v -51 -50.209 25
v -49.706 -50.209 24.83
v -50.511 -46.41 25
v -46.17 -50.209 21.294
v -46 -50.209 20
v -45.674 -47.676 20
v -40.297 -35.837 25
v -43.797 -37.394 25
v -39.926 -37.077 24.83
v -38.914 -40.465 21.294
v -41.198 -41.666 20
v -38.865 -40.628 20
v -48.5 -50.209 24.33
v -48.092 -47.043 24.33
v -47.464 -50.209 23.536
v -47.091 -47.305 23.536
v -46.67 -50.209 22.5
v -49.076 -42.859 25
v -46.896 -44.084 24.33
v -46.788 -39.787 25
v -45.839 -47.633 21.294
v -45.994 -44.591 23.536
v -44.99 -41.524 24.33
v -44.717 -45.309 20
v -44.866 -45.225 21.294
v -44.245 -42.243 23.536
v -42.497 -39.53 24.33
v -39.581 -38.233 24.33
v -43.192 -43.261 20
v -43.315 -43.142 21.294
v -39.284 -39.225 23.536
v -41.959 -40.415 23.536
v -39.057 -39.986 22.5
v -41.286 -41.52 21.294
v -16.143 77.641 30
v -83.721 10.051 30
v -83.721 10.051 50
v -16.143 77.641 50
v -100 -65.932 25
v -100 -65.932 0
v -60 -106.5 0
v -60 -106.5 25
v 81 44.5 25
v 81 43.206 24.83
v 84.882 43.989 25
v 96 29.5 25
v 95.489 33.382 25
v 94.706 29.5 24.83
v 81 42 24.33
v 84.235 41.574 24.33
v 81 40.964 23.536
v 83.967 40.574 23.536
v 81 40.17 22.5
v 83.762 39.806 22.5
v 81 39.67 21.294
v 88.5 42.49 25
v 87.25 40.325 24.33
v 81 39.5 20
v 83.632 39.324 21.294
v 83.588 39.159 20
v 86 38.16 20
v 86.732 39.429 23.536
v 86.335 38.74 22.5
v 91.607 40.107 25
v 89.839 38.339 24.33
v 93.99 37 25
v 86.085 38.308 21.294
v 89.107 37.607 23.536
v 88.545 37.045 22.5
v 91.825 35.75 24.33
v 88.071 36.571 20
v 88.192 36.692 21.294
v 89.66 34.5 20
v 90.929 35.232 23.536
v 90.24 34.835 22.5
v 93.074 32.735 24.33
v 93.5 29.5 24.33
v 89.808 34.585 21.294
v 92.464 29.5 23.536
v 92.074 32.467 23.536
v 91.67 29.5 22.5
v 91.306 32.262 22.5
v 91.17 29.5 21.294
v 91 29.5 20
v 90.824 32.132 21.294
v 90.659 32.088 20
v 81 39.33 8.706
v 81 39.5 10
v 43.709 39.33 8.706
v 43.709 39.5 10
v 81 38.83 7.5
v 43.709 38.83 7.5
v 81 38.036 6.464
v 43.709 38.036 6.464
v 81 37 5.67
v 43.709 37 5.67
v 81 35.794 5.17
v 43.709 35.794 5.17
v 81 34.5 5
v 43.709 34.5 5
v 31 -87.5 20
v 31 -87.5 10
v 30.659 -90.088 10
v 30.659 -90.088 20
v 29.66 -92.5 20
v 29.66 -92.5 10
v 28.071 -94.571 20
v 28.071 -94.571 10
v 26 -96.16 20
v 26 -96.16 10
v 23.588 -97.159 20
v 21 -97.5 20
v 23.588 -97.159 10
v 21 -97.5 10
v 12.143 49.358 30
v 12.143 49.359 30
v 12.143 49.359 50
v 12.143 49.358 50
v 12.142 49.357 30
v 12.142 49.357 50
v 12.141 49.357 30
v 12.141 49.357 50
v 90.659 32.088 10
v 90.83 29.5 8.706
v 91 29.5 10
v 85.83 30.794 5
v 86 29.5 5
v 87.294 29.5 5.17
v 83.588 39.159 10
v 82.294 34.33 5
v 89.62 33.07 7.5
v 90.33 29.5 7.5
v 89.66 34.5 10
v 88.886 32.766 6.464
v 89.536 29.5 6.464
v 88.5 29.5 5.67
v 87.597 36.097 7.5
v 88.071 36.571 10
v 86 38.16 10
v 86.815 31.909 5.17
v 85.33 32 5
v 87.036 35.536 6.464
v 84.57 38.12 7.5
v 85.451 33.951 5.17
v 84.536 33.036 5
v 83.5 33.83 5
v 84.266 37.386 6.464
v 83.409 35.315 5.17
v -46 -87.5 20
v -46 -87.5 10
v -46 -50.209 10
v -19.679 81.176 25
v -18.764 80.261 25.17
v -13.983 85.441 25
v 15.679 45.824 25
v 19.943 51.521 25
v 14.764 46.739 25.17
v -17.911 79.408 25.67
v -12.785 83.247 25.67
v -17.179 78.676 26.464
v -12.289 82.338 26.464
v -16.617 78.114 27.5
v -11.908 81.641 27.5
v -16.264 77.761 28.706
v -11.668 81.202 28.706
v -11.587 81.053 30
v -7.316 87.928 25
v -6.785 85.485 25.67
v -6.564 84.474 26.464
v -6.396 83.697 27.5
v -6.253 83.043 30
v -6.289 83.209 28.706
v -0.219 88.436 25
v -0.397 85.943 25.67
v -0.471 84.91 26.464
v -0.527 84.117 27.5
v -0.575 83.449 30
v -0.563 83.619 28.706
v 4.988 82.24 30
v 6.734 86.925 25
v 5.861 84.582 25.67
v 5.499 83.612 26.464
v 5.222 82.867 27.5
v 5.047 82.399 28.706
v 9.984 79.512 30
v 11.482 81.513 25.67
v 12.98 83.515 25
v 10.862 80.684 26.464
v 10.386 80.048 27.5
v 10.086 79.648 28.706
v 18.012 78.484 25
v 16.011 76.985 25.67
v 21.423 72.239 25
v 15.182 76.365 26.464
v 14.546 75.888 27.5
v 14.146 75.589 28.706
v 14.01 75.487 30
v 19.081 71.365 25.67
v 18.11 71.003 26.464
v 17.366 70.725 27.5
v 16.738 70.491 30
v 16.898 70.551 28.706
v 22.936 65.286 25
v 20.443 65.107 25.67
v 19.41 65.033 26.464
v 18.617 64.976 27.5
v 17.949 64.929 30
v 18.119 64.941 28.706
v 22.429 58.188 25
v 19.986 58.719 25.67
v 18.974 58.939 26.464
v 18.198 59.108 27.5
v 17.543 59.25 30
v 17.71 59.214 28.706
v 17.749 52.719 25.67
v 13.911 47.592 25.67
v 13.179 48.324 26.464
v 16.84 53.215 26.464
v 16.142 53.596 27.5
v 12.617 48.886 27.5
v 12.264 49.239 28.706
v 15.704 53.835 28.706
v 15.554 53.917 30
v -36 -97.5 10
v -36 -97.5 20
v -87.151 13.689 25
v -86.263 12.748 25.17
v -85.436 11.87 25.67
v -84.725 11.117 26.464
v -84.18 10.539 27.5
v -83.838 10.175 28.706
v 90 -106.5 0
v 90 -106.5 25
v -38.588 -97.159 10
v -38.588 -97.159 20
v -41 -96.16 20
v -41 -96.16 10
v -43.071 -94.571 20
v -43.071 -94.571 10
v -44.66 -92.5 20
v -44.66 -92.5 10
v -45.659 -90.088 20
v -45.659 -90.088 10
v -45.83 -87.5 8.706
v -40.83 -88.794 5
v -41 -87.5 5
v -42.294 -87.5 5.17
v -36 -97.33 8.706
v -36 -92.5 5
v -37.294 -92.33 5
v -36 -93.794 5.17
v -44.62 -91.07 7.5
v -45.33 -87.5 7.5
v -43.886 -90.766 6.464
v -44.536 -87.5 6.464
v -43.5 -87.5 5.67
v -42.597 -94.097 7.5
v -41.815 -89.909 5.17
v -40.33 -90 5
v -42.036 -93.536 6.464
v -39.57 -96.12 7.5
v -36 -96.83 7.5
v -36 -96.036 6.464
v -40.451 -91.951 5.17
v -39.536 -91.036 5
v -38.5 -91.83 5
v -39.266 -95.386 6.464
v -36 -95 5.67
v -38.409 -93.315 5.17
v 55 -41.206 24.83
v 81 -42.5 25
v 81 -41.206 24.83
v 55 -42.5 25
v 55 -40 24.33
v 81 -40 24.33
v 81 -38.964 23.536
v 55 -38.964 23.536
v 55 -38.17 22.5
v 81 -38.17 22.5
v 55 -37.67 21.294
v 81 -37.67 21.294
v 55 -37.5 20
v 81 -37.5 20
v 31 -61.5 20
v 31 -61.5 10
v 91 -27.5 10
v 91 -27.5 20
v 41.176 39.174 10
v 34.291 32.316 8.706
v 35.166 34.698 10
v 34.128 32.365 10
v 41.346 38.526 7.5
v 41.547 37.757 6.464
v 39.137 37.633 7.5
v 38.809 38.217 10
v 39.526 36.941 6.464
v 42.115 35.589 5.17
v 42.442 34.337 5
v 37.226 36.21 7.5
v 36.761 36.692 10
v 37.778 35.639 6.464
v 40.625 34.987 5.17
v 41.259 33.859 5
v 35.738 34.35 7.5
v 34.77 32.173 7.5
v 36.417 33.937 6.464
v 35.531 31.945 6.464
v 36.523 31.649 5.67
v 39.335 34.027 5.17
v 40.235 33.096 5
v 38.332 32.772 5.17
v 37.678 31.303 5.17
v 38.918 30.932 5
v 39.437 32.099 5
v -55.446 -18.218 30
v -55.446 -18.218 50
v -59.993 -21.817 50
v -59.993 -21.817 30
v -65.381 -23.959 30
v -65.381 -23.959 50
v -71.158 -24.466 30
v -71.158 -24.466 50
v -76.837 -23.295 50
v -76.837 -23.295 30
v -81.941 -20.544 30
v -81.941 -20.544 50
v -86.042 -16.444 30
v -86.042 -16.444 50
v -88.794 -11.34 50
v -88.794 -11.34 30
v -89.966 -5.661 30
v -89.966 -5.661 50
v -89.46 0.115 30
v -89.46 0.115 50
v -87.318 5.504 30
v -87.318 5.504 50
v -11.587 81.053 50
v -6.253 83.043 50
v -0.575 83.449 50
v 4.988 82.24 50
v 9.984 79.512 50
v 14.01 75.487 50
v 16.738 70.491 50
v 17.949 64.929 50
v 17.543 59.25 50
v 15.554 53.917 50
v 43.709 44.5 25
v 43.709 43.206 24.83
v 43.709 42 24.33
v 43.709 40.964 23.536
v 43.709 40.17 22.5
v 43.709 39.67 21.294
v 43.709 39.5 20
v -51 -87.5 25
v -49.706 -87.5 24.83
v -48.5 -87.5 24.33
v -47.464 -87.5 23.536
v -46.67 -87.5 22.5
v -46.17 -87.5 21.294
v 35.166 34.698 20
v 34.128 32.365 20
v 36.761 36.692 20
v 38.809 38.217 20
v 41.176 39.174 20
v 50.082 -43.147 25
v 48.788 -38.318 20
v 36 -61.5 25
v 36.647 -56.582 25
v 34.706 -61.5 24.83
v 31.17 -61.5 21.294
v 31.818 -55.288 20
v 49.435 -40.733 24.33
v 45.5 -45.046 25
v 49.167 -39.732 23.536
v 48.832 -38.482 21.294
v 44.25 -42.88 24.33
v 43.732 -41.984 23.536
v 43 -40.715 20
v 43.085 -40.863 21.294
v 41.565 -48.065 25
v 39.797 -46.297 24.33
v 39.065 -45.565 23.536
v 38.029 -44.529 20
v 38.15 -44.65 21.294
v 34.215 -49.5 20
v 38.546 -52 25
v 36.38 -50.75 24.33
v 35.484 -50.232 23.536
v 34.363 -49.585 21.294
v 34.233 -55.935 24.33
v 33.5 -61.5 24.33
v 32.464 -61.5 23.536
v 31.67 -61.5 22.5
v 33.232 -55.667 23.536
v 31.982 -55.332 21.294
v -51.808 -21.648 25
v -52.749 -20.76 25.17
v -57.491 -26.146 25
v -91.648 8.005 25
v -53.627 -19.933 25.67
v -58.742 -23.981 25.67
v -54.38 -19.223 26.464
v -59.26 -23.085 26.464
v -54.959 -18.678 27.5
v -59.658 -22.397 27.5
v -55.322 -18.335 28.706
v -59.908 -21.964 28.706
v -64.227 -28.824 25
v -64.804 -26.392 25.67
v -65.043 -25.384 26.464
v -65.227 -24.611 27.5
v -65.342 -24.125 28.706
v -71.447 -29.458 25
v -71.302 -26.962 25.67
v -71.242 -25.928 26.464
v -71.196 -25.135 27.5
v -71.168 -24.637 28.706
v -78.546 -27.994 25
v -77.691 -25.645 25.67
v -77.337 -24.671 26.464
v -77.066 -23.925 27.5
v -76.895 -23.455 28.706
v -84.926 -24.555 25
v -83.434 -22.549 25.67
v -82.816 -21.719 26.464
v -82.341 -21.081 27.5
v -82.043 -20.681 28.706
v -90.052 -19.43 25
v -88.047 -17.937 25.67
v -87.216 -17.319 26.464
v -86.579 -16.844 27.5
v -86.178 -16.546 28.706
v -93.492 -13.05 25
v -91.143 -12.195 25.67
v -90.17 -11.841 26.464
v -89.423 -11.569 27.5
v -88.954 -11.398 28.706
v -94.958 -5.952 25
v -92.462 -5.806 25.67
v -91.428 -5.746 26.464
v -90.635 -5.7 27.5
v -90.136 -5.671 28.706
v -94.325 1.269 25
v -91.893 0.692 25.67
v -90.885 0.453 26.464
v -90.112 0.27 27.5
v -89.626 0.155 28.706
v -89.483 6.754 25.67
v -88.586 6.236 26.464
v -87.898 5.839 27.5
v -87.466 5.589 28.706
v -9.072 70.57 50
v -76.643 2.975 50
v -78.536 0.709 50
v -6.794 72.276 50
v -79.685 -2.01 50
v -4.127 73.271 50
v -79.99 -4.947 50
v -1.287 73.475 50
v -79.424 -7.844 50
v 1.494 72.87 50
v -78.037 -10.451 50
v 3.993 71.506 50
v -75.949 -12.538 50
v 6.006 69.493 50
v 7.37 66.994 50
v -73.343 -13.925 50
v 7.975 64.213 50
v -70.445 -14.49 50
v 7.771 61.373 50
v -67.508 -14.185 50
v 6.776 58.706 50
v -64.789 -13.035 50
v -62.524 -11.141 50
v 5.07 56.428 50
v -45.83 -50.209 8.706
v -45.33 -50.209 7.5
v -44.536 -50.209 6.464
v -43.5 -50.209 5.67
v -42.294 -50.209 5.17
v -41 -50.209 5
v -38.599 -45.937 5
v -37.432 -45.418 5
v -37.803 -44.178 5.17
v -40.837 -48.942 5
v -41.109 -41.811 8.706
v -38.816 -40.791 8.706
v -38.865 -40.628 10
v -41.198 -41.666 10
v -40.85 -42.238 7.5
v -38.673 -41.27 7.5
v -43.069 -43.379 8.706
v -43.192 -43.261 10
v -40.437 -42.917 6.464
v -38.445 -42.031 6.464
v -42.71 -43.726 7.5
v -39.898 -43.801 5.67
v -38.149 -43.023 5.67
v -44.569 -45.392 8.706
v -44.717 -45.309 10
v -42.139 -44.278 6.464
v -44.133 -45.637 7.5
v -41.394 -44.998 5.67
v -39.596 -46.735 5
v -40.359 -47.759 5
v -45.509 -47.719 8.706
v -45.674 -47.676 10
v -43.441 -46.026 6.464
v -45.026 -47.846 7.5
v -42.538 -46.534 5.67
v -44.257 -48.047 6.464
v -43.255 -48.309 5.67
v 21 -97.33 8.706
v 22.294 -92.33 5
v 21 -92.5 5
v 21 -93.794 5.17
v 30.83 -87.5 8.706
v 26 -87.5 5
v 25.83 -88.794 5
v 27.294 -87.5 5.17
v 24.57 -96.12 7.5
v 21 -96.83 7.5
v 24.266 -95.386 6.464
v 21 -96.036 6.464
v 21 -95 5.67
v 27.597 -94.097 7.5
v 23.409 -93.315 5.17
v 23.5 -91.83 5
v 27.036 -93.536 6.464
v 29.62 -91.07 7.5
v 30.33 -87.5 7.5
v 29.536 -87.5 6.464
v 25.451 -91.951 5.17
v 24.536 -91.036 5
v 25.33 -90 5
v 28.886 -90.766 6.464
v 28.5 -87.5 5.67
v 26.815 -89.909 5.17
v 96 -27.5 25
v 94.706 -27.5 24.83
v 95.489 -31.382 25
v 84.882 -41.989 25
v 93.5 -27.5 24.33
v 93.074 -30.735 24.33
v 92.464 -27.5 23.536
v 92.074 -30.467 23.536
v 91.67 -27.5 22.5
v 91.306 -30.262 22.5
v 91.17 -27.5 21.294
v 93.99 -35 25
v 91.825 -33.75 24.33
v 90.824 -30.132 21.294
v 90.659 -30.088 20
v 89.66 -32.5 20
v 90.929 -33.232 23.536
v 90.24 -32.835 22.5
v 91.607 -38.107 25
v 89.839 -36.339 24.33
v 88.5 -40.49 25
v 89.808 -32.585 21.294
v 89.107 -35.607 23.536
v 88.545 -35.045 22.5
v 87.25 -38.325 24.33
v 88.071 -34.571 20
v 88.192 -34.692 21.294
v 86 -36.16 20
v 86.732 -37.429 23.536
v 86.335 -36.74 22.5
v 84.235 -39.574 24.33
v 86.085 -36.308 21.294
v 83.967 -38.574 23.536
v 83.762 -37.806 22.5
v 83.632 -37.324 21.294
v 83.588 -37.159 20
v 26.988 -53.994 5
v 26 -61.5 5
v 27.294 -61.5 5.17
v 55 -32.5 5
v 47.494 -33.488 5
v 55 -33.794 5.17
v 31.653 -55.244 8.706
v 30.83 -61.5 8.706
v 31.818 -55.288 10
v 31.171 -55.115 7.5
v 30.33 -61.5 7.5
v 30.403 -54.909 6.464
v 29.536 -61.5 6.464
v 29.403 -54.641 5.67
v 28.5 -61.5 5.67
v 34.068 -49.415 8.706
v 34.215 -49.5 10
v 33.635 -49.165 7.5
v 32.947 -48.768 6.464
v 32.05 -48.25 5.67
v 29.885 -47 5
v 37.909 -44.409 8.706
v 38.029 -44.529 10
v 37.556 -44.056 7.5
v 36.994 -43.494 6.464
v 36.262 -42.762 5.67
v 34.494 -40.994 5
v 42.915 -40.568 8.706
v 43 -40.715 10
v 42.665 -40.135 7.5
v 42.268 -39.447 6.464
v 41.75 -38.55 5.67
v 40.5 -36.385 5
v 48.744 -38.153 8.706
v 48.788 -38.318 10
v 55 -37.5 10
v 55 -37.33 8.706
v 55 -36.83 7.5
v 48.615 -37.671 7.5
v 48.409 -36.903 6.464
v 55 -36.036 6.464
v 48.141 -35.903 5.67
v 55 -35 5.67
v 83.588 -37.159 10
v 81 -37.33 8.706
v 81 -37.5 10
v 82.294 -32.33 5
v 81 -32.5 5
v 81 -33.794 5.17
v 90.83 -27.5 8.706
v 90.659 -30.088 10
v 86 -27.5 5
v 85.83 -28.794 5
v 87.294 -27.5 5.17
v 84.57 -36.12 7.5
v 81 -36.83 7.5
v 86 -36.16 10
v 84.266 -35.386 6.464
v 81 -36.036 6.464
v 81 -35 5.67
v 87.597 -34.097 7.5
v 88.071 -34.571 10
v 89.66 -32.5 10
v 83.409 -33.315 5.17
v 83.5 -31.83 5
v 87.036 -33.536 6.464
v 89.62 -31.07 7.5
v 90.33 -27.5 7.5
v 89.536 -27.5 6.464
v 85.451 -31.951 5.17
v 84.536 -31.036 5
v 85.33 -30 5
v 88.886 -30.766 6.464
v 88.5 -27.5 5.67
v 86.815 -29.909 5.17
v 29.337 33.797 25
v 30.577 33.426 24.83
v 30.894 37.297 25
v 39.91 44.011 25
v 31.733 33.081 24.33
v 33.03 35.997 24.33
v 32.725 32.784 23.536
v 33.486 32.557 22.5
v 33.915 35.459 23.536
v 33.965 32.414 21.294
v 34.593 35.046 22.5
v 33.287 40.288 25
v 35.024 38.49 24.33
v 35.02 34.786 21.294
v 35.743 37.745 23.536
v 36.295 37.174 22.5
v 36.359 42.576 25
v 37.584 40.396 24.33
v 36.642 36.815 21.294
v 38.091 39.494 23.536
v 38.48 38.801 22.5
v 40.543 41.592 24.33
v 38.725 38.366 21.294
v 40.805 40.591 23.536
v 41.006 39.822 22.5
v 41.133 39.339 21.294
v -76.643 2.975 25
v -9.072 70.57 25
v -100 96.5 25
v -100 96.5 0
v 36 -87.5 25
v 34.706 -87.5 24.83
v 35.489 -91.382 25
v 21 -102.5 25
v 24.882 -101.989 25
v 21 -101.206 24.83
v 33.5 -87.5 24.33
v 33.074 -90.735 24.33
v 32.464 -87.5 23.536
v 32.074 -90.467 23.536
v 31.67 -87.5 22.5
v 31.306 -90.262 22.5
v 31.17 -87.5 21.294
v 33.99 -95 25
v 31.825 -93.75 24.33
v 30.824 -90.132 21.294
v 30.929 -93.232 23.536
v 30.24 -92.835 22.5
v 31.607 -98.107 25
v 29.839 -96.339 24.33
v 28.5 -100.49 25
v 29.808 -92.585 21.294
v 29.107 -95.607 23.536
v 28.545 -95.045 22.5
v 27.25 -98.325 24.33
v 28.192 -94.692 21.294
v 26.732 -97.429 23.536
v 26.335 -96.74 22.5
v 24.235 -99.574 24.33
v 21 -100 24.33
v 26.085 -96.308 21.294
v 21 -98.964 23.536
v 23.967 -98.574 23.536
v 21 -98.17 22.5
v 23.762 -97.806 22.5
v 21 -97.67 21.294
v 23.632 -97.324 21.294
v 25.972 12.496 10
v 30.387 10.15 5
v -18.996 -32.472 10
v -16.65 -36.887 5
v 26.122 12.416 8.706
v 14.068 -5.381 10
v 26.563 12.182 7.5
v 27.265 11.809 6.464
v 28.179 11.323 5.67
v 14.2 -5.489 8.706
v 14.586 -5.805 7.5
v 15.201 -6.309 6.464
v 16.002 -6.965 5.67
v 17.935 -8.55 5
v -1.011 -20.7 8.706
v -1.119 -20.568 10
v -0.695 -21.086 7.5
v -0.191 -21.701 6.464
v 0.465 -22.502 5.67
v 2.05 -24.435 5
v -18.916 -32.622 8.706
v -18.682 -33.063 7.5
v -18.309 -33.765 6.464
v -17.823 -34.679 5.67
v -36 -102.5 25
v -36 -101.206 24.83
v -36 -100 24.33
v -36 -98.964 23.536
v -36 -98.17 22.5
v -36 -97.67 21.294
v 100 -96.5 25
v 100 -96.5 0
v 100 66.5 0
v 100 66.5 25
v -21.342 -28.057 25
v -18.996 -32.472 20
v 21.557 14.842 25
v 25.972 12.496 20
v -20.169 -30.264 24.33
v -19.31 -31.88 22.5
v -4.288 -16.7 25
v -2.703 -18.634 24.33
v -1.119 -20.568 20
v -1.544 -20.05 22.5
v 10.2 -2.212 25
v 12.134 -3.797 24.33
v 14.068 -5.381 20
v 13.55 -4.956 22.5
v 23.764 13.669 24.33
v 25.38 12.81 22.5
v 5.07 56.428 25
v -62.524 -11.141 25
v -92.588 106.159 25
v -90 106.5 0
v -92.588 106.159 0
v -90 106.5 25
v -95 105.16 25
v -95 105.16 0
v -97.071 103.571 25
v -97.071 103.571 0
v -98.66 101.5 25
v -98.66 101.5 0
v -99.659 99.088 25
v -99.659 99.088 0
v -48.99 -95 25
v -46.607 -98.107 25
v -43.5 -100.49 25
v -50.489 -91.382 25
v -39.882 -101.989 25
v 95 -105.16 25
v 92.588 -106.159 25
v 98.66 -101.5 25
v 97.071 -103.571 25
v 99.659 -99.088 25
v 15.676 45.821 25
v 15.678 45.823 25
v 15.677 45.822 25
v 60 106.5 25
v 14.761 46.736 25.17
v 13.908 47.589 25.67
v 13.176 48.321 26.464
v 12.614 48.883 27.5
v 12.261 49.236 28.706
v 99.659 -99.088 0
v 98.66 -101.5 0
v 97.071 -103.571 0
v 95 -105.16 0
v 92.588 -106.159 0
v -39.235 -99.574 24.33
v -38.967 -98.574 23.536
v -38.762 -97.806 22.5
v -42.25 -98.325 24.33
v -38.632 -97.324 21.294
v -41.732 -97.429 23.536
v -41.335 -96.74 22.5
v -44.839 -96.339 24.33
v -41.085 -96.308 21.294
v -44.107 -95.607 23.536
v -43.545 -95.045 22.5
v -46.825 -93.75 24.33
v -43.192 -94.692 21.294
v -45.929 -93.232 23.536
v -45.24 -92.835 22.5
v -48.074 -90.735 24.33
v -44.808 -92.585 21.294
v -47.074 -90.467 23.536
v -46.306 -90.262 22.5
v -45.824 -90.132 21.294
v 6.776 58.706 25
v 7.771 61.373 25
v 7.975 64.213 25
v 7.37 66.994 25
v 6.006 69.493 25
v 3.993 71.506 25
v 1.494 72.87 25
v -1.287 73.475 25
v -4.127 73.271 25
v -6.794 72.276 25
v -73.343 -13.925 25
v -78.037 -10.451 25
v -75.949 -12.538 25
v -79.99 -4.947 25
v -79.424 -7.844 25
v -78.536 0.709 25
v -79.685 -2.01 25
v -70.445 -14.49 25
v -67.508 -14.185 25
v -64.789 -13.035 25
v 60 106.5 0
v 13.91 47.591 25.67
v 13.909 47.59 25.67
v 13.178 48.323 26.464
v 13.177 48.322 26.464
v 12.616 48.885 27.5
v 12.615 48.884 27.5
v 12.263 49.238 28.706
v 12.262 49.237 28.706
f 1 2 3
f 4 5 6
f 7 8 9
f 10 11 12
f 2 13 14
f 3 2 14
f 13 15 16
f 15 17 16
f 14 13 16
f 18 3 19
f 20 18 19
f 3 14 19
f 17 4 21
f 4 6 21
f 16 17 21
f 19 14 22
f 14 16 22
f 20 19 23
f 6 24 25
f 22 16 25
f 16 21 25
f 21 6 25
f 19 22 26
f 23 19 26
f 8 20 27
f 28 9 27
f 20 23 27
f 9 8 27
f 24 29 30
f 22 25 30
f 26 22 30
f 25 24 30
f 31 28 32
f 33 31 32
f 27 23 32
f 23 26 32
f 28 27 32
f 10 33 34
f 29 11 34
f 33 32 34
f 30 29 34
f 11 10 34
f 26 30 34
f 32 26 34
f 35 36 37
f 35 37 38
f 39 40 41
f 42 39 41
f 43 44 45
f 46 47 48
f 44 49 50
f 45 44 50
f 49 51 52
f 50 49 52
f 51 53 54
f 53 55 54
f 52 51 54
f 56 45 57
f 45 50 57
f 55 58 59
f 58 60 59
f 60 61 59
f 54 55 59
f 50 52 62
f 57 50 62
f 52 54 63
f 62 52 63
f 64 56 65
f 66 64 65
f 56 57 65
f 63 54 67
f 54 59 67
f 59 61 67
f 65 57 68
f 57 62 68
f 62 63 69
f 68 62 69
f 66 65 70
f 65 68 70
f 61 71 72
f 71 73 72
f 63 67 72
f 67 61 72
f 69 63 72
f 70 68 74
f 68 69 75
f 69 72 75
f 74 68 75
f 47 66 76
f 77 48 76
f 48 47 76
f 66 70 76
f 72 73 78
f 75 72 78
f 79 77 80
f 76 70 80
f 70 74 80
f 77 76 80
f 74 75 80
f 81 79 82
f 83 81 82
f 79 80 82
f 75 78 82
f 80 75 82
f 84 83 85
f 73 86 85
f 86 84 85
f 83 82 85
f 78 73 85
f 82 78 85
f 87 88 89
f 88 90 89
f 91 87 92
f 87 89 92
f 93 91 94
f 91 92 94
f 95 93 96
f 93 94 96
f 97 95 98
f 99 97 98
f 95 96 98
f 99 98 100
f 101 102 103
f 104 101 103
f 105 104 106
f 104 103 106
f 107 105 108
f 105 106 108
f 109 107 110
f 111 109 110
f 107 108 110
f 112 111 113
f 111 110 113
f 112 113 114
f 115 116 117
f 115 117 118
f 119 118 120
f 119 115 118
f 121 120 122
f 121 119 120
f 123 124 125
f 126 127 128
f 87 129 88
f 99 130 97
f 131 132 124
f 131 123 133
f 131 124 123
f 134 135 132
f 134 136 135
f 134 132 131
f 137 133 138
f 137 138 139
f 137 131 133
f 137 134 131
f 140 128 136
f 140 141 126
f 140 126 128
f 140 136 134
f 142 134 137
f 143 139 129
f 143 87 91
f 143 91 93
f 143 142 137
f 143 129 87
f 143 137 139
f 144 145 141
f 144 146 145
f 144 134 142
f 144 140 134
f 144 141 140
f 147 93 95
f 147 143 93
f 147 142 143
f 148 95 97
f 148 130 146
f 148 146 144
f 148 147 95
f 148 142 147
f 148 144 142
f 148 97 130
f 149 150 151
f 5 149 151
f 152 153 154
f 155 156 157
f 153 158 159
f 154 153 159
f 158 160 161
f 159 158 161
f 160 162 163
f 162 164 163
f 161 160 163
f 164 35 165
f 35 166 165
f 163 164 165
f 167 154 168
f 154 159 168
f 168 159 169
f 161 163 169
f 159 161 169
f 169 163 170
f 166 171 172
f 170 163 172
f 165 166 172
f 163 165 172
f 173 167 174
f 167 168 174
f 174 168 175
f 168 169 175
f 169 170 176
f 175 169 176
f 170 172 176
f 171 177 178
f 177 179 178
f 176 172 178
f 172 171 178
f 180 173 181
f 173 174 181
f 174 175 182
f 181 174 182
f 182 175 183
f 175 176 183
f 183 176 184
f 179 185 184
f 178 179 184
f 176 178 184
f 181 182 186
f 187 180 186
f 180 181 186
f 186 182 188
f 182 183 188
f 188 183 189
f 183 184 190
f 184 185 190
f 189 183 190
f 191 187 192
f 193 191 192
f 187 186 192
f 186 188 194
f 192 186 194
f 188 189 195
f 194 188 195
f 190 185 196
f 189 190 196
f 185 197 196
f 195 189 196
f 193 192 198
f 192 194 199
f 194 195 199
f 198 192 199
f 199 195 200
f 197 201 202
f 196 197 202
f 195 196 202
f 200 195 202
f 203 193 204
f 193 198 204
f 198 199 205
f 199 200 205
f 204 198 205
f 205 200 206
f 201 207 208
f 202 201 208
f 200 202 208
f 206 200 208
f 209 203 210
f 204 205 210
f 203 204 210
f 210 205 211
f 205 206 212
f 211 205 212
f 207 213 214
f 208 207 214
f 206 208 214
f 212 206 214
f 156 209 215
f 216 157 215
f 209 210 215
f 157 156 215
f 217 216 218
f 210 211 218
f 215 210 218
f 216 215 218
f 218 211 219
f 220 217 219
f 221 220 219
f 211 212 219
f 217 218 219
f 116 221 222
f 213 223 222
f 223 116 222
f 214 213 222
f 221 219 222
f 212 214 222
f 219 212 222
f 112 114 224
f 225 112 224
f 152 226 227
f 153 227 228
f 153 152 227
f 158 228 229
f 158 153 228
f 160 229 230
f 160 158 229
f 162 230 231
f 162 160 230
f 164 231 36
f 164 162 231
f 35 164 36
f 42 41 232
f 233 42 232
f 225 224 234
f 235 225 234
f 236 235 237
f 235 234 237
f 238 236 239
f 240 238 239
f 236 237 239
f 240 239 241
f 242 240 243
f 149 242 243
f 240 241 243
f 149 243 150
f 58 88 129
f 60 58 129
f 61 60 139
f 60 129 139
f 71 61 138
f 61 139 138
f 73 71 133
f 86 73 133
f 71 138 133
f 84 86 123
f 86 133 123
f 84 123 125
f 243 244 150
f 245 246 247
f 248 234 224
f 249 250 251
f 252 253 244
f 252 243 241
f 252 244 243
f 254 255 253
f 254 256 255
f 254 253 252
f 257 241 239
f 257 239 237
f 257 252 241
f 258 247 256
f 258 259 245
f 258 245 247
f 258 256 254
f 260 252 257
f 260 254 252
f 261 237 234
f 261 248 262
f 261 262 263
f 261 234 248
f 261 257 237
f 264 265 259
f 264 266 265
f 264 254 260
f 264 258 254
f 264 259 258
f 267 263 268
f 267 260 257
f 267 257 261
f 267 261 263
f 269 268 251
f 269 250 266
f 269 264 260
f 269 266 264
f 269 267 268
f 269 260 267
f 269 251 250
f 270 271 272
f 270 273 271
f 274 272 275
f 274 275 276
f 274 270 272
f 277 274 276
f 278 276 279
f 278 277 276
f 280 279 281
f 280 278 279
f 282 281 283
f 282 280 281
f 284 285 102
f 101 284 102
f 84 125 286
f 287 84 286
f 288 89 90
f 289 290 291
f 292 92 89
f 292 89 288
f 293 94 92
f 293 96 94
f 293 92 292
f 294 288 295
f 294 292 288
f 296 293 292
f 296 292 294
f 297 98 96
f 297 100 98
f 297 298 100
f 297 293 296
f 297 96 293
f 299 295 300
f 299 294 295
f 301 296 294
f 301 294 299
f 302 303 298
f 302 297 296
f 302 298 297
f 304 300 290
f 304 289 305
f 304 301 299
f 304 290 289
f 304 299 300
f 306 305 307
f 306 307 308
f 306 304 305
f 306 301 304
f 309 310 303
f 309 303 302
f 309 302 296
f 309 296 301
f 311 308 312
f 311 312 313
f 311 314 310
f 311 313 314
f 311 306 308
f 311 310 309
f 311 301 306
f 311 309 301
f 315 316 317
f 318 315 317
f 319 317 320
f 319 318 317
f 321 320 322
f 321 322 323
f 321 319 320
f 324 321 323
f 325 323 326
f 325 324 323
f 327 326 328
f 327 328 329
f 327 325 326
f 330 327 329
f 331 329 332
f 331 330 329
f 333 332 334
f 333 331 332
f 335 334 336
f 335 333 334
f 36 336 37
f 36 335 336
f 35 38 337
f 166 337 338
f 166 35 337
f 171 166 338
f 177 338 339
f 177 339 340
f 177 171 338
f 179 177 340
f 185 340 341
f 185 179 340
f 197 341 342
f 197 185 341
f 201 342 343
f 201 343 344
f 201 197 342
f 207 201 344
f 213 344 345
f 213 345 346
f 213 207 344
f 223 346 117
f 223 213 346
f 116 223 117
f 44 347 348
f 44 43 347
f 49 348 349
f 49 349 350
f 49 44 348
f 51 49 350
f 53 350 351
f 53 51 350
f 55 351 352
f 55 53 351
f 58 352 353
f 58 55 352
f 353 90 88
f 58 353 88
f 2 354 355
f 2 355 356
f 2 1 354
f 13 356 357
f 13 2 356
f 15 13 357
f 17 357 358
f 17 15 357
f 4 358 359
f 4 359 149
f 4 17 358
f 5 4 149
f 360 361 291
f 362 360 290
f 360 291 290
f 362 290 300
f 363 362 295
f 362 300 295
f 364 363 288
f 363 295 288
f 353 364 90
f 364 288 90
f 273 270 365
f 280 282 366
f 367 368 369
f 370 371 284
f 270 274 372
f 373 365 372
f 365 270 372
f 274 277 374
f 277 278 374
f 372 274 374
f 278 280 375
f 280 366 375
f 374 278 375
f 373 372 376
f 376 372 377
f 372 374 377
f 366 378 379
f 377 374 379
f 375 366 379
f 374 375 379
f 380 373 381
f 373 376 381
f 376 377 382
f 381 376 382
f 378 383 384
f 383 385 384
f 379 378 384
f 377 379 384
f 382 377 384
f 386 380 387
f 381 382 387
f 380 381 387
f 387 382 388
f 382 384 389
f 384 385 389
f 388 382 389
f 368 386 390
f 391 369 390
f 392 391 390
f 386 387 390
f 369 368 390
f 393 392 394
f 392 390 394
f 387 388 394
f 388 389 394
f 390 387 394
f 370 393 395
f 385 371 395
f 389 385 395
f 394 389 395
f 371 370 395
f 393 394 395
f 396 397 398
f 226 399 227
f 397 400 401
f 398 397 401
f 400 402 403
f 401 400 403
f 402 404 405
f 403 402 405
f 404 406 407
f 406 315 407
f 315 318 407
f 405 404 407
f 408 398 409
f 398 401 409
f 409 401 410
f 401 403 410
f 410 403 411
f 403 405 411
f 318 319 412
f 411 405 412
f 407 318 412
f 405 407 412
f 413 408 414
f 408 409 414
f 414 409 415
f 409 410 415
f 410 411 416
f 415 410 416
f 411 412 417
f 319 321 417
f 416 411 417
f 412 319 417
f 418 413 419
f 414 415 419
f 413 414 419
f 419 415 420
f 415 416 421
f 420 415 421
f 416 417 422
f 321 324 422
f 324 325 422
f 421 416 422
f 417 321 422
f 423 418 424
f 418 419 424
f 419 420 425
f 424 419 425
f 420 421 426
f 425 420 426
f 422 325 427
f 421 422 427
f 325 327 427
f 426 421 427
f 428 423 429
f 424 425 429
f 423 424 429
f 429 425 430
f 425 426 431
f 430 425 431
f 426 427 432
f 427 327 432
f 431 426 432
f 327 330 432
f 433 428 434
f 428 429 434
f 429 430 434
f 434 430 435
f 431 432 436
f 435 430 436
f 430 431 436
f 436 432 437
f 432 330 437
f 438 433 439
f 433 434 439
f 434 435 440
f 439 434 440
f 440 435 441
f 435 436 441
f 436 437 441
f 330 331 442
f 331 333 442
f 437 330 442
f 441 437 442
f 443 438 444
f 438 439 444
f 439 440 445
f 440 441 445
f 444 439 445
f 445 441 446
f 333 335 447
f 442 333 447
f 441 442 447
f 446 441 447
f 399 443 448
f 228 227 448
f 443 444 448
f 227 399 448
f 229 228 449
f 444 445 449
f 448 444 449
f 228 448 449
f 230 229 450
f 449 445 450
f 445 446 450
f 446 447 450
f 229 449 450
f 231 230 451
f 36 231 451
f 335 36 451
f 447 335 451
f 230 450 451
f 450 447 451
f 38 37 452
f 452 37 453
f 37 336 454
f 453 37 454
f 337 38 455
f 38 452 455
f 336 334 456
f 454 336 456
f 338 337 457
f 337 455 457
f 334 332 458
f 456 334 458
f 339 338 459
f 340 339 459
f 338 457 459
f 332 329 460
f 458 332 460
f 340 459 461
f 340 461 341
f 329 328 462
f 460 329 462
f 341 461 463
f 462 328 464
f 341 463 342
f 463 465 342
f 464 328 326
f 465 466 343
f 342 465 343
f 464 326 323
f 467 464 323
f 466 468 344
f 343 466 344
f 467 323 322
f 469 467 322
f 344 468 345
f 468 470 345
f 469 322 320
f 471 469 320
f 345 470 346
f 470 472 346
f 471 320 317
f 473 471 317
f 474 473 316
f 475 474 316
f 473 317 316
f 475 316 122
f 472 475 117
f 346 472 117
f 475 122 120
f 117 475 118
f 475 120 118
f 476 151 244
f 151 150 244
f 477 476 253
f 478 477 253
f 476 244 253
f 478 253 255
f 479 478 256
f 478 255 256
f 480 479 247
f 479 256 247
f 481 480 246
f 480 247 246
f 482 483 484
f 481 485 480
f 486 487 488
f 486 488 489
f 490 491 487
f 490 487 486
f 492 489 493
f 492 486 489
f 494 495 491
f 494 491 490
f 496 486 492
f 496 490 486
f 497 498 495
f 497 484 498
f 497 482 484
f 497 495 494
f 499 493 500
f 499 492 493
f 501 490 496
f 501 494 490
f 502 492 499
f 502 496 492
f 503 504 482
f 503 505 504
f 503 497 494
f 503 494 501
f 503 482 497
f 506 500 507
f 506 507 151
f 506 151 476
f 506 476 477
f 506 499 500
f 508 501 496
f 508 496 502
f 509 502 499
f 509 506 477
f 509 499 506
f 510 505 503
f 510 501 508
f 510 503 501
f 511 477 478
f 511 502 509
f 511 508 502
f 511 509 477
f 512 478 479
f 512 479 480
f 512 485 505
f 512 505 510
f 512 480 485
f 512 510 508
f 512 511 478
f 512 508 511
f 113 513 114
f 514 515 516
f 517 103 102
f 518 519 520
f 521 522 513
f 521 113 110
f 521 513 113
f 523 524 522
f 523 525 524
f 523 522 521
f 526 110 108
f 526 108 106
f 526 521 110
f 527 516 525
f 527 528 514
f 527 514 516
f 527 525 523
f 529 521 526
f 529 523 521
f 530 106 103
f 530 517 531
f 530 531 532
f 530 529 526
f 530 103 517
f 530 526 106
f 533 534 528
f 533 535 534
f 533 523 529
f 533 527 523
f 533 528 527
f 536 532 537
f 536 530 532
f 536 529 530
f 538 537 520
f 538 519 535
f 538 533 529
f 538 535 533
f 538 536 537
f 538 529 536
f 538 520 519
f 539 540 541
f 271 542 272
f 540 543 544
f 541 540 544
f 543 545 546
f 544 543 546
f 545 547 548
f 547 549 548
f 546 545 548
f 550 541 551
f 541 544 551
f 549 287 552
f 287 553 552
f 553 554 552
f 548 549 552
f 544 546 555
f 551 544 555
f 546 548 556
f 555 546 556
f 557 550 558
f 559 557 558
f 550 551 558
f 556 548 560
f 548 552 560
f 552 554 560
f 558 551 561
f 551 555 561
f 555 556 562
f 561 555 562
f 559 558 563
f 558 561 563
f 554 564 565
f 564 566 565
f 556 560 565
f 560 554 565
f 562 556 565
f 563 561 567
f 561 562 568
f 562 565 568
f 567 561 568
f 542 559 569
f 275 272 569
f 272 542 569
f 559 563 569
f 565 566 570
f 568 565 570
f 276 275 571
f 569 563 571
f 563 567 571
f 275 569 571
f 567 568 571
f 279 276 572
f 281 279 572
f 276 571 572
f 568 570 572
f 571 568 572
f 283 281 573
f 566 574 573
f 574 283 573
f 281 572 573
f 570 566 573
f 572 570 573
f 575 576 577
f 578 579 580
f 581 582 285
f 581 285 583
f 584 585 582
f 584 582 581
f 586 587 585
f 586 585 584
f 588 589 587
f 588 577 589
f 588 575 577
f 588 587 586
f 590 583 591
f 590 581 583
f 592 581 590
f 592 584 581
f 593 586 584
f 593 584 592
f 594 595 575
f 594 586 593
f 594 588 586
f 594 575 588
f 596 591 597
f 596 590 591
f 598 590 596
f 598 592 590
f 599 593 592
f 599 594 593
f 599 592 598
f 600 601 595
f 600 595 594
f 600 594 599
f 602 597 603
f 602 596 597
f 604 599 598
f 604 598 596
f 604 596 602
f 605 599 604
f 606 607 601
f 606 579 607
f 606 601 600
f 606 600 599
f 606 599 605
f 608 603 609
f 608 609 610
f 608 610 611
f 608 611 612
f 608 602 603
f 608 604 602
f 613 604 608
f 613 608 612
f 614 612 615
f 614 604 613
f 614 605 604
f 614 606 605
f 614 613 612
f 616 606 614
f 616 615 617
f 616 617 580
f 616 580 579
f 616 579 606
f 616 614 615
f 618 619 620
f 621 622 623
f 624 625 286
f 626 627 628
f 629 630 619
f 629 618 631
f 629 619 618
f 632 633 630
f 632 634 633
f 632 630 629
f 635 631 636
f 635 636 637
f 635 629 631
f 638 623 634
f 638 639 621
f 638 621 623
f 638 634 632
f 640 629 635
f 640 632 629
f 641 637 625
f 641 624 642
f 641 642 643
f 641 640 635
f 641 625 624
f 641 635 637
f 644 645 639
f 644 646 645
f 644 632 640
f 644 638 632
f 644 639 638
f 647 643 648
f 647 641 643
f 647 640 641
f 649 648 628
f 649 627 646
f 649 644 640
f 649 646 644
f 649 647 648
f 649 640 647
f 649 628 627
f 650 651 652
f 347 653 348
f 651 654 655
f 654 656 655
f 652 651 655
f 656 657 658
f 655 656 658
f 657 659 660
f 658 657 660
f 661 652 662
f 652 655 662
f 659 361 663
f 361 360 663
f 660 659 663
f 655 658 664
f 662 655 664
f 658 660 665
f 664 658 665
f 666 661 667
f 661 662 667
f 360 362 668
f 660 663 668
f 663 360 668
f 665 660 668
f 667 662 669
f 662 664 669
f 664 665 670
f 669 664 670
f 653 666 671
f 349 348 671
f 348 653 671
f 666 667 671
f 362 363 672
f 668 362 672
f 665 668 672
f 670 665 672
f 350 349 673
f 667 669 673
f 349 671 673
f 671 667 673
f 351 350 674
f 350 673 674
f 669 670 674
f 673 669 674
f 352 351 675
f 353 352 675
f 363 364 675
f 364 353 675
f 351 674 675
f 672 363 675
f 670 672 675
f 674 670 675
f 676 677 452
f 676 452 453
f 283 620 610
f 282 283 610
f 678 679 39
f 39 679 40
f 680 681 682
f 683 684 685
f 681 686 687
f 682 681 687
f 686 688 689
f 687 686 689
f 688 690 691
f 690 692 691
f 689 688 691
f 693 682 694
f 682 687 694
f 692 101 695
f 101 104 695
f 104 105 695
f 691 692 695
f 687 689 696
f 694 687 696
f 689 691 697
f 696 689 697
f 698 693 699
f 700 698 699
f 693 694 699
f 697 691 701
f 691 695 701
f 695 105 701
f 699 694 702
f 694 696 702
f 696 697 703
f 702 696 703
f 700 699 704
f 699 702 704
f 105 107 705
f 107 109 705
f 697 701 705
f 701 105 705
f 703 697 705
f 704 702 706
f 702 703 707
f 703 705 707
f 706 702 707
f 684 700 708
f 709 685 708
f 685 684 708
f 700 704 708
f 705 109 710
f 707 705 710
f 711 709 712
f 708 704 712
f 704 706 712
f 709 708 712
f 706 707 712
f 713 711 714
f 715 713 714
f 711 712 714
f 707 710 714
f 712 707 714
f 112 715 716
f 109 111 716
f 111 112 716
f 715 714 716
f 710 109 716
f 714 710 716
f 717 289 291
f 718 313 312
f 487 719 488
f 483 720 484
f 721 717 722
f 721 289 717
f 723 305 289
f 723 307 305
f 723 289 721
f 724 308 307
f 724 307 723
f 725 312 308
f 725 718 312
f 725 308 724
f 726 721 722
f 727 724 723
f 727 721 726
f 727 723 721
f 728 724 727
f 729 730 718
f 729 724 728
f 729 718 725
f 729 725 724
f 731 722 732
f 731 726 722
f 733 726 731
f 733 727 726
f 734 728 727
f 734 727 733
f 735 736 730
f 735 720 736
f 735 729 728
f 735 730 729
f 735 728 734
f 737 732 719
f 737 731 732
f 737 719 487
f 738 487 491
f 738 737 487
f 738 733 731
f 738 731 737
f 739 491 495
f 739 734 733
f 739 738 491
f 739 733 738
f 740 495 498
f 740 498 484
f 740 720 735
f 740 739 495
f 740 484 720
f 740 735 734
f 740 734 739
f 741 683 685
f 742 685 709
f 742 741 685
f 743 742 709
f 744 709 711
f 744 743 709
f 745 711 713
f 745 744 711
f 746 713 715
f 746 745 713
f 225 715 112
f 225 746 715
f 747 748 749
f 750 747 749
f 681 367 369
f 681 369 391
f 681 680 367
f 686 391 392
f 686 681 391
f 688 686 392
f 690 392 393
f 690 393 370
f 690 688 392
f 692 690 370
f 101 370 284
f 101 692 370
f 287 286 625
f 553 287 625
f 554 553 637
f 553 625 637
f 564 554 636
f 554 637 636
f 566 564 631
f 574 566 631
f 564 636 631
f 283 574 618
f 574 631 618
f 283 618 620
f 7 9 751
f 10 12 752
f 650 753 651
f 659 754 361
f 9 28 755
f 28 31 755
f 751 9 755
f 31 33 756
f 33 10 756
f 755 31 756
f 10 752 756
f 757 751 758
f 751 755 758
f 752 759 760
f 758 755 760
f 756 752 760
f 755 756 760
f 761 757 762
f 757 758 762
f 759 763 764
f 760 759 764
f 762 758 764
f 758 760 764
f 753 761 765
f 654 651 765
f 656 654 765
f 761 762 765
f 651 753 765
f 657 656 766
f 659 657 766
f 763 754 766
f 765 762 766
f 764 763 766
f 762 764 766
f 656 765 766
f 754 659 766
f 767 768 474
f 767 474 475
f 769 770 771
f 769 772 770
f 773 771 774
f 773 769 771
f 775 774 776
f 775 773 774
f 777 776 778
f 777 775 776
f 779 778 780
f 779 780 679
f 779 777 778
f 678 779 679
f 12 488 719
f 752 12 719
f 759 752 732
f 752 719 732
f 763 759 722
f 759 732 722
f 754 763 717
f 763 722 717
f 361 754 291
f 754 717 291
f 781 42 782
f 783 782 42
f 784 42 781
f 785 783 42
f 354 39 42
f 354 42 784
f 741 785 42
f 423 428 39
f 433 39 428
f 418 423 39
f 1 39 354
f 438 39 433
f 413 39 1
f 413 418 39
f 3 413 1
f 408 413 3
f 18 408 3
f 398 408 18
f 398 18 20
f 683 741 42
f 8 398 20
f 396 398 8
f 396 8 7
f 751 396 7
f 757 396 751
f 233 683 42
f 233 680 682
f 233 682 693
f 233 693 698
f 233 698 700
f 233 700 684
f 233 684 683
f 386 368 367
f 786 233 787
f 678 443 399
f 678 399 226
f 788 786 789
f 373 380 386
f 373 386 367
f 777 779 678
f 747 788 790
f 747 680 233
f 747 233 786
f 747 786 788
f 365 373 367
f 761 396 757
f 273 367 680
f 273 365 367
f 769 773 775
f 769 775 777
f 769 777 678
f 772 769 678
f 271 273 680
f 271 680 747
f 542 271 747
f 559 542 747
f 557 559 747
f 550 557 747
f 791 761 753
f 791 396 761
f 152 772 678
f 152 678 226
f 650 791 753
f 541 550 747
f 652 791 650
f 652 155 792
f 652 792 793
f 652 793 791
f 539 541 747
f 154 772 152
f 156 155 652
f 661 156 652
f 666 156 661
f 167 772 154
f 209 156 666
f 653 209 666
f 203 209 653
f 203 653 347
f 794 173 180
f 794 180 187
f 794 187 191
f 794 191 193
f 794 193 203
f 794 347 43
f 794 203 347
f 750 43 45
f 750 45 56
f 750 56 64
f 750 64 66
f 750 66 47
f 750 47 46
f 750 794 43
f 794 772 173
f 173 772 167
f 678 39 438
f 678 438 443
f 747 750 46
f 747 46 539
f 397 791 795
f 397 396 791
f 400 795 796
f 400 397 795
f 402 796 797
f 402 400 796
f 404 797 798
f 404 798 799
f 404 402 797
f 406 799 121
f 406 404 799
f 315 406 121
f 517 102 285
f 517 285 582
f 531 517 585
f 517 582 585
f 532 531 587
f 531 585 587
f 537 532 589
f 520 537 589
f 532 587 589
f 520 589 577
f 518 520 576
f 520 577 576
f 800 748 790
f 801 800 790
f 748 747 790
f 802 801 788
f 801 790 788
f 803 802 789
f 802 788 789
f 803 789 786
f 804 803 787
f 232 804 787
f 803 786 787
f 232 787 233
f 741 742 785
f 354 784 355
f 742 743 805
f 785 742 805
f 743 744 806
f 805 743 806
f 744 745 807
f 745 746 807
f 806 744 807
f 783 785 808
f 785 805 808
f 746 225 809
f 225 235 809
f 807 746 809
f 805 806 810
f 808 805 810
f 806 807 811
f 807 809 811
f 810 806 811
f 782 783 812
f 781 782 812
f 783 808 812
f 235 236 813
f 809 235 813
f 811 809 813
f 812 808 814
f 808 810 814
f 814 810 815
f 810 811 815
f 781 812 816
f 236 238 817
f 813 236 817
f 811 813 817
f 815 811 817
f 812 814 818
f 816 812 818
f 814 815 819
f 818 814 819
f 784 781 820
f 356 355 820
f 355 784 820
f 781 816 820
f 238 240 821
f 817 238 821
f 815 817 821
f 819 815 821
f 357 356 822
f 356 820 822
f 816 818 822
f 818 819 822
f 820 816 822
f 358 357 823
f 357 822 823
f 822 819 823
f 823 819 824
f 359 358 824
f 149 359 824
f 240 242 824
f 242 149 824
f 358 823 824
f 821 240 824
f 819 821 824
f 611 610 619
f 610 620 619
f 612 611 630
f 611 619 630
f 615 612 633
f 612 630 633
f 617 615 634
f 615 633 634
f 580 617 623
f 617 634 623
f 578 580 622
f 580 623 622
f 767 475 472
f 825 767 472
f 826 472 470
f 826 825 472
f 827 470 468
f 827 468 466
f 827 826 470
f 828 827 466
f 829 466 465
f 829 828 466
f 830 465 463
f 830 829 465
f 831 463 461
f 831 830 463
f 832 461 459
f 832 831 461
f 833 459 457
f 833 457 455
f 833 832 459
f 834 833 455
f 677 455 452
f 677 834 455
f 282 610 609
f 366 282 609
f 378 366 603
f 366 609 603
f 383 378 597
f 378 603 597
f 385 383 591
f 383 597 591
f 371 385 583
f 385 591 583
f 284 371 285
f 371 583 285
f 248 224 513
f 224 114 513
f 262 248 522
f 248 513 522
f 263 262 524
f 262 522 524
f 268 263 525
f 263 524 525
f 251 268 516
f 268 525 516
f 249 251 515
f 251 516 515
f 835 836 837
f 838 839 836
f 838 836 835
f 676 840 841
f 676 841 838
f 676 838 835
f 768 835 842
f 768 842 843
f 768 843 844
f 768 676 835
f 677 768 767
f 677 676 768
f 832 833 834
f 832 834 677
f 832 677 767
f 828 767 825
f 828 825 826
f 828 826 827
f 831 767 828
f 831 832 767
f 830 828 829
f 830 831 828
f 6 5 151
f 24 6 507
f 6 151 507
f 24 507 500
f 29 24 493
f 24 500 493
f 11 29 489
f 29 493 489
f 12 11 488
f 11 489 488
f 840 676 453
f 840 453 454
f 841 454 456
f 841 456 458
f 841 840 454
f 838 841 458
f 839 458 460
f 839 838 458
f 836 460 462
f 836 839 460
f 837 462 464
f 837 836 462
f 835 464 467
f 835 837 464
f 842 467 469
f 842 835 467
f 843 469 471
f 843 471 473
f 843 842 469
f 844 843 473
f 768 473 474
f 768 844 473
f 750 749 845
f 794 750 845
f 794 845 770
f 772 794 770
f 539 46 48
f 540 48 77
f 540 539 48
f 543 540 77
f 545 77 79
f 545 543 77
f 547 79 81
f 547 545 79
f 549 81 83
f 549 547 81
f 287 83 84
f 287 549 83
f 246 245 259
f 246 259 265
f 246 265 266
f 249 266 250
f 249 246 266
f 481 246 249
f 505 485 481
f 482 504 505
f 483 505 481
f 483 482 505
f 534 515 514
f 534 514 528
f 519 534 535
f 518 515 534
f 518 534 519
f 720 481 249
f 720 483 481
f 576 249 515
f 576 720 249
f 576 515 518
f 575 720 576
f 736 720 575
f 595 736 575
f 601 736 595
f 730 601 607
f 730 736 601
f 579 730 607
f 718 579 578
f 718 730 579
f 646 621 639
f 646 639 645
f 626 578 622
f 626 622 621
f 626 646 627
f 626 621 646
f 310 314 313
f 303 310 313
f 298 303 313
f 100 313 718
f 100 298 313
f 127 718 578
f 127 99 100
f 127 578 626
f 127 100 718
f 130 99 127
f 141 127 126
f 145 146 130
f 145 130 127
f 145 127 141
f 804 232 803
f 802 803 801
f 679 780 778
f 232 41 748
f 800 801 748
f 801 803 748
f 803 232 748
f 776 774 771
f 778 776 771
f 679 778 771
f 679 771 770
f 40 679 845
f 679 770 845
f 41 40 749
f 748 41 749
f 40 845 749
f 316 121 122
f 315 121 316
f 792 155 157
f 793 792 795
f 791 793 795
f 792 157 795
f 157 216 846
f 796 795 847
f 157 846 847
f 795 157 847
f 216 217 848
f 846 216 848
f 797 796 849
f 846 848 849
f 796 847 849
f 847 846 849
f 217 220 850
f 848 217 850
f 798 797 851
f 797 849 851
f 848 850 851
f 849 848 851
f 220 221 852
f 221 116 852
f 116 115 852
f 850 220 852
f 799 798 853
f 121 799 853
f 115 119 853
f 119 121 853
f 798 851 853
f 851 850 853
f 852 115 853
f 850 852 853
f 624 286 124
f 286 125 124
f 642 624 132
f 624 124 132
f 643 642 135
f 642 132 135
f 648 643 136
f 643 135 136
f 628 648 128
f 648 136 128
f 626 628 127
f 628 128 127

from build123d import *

# Parameters (mm, degrees)
F1_DEPTH = 25
F4_DEPTH = 25
F5_DEPTH = 5
F6_R     = 5
F7_R     = 10


with BuildPart() as f1:
    # F0 (on Top) → F1 (new body)
    with BuildSketch(Plane.XY):
        Polygon((60, 106.5), (-100, 106.5), (-100, -65.9319981933), (-60, -106.5), (100, -106.5), (100, 66.5), align=None)
        with BuildLine():
            Line((81, -37.5), (55, -37.5))
            ThreePointArc((55, -37.5), (38.0294372515, -44.5294372515), (31, -61.5))
            Line((31, -61.5), (31, -87.5))
            ThreePointArc((31, -87.5), (28.0710678119, -94.5710678119), (21, -97.5))
            Line((21, -97.5), (-36, -97.5))
            ThreePointArc((-36, -97.5), (-43.0710678119, -94.5710678119), (-46, -87.5))
            Line((-46, -87.5), (-46, -50.2086650483))
            ThreePointArc((-46, -50.2086650483), (-44.0202162123, -44.2357150312), (-38.8647736185, -40.6277949357))
            ThreePointArc((-38.8647736185, -40.6277949357), (6.8505042274, -13.3505042274), (34.1277949357, 32.3647736185))
            ThreePointArc((34.1277949357, 32.3647736185), (37.7357150312, 37.5202162123), (43.7086650483, 39.5))
            Line((43.7086650483, 39.5), (81, 39.5))
            ThreePointArc((81, 39.5), (88.0710678119, 36.5710678119), (91, 29.5))
            Line((91, 29.5), (91, -27.5))
            ThreePointArc((91, -27.5), (88.0710678119, -34.5710678119), (81, -37.5))
        make_face(mode=Mode.SUBTRACT)
    extrude(amount=F1_DEPTH)

    # F3 (on offset) → F4 (join)
    with BuildSketch(Plane(origin=(0, 0, 25), x_dir=(1, 0, 0), z_dir=(0, 0, -1))):
        with BuildLine():
            Line((12.1408432435, -49.3565721142), (-55.4461455939, 18.2180655315))
            ThreePointArc((-55.4461455939, 18.2180655315), (-84.1408590322, 18.6434121001), (-83.720692703, -10.0513776581))
            Line((-83.720692703, -10.0513776581), (-16.1434121001, -77.6408590322))
            ThreePointArc((-16.1434121001, -77.6408590322), (12.1408595897, -77.6434115426), (12.1434109852, -49.3591398528))
            ThreePointArc((12.1434109852, -49.3591398528), (12.1421271726, -49.3578559252), (12.1408432435, -49.3565721142))
        make_face()
        with BuildLine():
            ThreePointArc((-76.6428401008, -2.9748026994), (-77.0704295161, 11.57170605), (-62.5239981961, 11.1414905727))
            Line((-62.5239981961, 11.1414905727), (5.0697784915, -56.4276431028))
            ThreePointArc((5.0697784915, -56.4276431028), (5.0710717587, -70.5710638651), (-9.072349005, -70.5697863865))
            Line((-9.072349005, -70.5697863865), (-76.6428401008, -2.9748026994))
        make_face(mode=Mode.SUBTRACT)
    extrude(amount=-F4_DEPTH)

    # F0 (on Top) → F5 (join)
    with BuildSketch(Plane.XY):
        with BuildLine():
            ThreePointArc((31, -61.5), (38.0294372515, -44.5294372515), (55, -37.5))
            Line((55, -37.5), (81, -37.5))
            ThreePointArc((81, -37.5), (88.0710678119, -34.5710678119), (91, -27.5))
            Line((91, -27.5), (91, 29.5))
            ThreePointArc((91, 29.5), (88.0710678119, 36.5710678119), (81, 39.5))
            Line((81, 39.5), (43.7086650483, 39.5))
            ThreePointArc((43.7086650483, 39.5), (37.7357150312, 37.5202162123), (34.1277949357, 32.3647736185))
            ThreePointArc((34.1277949357, 32.3647736185), (6.8505042274, -13.3505042274), (-38.8647736185, -40.6277949357))
            ThreePointArc((-38.8647736185, -40.6277949357), (-44.0202162123, -44.2357150312), (-46, -50.2086650483))
            Line((-46, -50.2086650483), (-46, -87.5))
            ThreePointArc((-46, -87.5), (-43.0710678119, -94.5710678119), (-36, -97.5))
            Line((-36, -97.5), (21, -97.5))
            ThreePointArc((21, -97.5), (28.0710678119, -94.5710678119), (31, -87.5))
            Line((31, -87.5), (31, -61.5))
        make_face()
    extrude(amount=F5_DEPTH)

    # F6
    f6_edges = [f1.edges().sort_by_distance(p)[0] for p in [
        (-84.140859, -18.643412, 25),
        (-21.652651, 15.569253, 25),
        (6.850504, -13.350504, 25),
        (31, -74.5, 5),
        (38.029437, -44.529437, 5),
        (68, -37.5, 5),
        (88.071068, -34.571068, 5),
        (91, 1, 5),
        (88.071068, 36.571068, 5),
        (62.354333, 39.5, 5),
        (37.735715, 37.520216, 5),
        (6.850504, -13.350504, 5),
        (-44.020216, -44.235715, 5),
        (-46, -68.854333, 5),
        (-43.071068, -94.571068, 5),
        (-7.5, -97.5, 5),
        (28.071068, -94.571068, 5),
    ]]
    fillet(f6_edges, radius=F6_R)

    # F7
    f7_edges = [f1.edges().sort_by_distance(p)[0] for p in [
        (-100, 106.5, 12.5),
        (100, -106.5, 12.5),
    ]]
    fillet(f7_edges, radius=F7_R)


solid = f1.part
